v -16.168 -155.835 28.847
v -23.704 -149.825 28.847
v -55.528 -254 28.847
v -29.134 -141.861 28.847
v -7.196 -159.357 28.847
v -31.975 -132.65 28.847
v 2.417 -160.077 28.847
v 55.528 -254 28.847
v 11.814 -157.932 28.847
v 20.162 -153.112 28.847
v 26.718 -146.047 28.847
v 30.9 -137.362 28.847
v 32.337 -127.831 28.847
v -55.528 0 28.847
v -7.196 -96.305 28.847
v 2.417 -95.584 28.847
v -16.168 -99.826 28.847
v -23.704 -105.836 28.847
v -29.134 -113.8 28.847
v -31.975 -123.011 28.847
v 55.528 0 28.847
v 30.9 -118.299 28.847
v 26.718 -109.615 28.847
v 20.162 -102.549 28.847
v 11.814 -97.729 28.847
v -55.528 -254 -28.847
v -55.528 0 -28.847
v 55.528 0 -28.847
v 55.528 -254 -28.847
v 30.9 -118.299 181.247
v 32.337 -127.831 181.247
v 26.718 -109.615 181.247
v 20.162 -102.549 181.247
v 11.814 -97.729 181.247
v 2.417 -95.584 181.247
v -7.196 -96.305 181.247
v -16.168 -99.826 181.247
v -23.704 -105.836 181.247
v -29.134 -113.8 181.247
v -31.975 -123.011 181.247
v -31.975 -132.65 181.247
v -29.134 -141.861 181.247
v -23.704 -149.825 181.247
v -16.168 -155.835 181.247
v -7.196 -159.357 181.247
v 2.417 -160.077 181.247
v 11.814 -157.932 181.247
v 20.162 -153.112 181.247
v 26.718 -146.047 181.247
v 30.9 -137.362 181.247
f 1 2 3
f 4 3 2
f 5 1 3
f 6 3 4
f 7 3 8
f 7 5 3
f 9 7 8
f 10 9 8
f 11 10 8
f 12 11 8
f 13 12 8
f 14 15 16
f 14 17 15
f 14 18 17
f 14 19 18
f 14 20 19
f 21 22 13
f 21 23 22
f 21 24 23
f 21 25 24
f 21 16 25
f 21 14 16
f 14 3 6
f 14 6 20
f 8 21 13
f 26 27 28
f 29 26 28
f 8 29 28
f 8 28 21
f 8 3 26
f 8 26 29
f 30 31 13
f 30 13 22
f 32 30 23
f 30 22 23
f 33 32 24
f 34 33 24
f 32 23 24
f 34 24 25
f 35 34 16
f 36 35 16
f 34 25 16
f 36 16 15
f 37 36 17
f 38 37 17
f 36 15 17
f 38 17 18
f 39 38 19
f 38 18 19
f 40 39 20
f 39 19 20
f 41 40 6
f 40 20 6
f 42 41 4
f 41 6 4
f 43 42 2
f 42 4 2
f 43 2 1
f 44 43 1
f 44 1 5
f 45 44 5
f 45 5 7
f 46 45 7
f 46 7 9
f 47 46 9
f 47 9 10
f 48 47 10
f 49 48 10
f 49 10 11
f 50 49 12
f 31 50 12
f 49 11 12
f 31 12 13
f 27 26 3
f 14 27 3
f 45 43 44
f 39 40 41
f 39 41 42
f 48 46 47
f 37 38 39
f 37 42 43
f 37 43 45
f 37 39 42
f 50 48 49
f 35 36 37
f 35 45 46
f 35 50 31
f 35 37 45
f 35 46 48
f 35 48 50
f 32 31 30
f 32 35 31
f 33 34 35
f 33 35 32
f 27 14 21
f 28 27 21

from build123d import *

# Parameters (mm, degrees)
F0_W     = 111.05685
F0_H     = 57.694792
F1_DEPTH = 254
F2_R     = 32.336648
F3_DEPTH = 152.4


with BuildPart() as f1:
    # F0 (on Front) → F1 (new body)
    with BuildSketch(Plane.XZ):
        Rectangle(F0_W, F0_H)
    extrude(amount=F1_DEPTH)

    # F2 (on face) → F3 (join)
    with BuildSketch(Plane.XY.offset(28.847396)):
        with Locations((0, -127.830639)):
            Circle(F2_R)
    extrude(amount=F3_DEPTH)


solid = f1.part
